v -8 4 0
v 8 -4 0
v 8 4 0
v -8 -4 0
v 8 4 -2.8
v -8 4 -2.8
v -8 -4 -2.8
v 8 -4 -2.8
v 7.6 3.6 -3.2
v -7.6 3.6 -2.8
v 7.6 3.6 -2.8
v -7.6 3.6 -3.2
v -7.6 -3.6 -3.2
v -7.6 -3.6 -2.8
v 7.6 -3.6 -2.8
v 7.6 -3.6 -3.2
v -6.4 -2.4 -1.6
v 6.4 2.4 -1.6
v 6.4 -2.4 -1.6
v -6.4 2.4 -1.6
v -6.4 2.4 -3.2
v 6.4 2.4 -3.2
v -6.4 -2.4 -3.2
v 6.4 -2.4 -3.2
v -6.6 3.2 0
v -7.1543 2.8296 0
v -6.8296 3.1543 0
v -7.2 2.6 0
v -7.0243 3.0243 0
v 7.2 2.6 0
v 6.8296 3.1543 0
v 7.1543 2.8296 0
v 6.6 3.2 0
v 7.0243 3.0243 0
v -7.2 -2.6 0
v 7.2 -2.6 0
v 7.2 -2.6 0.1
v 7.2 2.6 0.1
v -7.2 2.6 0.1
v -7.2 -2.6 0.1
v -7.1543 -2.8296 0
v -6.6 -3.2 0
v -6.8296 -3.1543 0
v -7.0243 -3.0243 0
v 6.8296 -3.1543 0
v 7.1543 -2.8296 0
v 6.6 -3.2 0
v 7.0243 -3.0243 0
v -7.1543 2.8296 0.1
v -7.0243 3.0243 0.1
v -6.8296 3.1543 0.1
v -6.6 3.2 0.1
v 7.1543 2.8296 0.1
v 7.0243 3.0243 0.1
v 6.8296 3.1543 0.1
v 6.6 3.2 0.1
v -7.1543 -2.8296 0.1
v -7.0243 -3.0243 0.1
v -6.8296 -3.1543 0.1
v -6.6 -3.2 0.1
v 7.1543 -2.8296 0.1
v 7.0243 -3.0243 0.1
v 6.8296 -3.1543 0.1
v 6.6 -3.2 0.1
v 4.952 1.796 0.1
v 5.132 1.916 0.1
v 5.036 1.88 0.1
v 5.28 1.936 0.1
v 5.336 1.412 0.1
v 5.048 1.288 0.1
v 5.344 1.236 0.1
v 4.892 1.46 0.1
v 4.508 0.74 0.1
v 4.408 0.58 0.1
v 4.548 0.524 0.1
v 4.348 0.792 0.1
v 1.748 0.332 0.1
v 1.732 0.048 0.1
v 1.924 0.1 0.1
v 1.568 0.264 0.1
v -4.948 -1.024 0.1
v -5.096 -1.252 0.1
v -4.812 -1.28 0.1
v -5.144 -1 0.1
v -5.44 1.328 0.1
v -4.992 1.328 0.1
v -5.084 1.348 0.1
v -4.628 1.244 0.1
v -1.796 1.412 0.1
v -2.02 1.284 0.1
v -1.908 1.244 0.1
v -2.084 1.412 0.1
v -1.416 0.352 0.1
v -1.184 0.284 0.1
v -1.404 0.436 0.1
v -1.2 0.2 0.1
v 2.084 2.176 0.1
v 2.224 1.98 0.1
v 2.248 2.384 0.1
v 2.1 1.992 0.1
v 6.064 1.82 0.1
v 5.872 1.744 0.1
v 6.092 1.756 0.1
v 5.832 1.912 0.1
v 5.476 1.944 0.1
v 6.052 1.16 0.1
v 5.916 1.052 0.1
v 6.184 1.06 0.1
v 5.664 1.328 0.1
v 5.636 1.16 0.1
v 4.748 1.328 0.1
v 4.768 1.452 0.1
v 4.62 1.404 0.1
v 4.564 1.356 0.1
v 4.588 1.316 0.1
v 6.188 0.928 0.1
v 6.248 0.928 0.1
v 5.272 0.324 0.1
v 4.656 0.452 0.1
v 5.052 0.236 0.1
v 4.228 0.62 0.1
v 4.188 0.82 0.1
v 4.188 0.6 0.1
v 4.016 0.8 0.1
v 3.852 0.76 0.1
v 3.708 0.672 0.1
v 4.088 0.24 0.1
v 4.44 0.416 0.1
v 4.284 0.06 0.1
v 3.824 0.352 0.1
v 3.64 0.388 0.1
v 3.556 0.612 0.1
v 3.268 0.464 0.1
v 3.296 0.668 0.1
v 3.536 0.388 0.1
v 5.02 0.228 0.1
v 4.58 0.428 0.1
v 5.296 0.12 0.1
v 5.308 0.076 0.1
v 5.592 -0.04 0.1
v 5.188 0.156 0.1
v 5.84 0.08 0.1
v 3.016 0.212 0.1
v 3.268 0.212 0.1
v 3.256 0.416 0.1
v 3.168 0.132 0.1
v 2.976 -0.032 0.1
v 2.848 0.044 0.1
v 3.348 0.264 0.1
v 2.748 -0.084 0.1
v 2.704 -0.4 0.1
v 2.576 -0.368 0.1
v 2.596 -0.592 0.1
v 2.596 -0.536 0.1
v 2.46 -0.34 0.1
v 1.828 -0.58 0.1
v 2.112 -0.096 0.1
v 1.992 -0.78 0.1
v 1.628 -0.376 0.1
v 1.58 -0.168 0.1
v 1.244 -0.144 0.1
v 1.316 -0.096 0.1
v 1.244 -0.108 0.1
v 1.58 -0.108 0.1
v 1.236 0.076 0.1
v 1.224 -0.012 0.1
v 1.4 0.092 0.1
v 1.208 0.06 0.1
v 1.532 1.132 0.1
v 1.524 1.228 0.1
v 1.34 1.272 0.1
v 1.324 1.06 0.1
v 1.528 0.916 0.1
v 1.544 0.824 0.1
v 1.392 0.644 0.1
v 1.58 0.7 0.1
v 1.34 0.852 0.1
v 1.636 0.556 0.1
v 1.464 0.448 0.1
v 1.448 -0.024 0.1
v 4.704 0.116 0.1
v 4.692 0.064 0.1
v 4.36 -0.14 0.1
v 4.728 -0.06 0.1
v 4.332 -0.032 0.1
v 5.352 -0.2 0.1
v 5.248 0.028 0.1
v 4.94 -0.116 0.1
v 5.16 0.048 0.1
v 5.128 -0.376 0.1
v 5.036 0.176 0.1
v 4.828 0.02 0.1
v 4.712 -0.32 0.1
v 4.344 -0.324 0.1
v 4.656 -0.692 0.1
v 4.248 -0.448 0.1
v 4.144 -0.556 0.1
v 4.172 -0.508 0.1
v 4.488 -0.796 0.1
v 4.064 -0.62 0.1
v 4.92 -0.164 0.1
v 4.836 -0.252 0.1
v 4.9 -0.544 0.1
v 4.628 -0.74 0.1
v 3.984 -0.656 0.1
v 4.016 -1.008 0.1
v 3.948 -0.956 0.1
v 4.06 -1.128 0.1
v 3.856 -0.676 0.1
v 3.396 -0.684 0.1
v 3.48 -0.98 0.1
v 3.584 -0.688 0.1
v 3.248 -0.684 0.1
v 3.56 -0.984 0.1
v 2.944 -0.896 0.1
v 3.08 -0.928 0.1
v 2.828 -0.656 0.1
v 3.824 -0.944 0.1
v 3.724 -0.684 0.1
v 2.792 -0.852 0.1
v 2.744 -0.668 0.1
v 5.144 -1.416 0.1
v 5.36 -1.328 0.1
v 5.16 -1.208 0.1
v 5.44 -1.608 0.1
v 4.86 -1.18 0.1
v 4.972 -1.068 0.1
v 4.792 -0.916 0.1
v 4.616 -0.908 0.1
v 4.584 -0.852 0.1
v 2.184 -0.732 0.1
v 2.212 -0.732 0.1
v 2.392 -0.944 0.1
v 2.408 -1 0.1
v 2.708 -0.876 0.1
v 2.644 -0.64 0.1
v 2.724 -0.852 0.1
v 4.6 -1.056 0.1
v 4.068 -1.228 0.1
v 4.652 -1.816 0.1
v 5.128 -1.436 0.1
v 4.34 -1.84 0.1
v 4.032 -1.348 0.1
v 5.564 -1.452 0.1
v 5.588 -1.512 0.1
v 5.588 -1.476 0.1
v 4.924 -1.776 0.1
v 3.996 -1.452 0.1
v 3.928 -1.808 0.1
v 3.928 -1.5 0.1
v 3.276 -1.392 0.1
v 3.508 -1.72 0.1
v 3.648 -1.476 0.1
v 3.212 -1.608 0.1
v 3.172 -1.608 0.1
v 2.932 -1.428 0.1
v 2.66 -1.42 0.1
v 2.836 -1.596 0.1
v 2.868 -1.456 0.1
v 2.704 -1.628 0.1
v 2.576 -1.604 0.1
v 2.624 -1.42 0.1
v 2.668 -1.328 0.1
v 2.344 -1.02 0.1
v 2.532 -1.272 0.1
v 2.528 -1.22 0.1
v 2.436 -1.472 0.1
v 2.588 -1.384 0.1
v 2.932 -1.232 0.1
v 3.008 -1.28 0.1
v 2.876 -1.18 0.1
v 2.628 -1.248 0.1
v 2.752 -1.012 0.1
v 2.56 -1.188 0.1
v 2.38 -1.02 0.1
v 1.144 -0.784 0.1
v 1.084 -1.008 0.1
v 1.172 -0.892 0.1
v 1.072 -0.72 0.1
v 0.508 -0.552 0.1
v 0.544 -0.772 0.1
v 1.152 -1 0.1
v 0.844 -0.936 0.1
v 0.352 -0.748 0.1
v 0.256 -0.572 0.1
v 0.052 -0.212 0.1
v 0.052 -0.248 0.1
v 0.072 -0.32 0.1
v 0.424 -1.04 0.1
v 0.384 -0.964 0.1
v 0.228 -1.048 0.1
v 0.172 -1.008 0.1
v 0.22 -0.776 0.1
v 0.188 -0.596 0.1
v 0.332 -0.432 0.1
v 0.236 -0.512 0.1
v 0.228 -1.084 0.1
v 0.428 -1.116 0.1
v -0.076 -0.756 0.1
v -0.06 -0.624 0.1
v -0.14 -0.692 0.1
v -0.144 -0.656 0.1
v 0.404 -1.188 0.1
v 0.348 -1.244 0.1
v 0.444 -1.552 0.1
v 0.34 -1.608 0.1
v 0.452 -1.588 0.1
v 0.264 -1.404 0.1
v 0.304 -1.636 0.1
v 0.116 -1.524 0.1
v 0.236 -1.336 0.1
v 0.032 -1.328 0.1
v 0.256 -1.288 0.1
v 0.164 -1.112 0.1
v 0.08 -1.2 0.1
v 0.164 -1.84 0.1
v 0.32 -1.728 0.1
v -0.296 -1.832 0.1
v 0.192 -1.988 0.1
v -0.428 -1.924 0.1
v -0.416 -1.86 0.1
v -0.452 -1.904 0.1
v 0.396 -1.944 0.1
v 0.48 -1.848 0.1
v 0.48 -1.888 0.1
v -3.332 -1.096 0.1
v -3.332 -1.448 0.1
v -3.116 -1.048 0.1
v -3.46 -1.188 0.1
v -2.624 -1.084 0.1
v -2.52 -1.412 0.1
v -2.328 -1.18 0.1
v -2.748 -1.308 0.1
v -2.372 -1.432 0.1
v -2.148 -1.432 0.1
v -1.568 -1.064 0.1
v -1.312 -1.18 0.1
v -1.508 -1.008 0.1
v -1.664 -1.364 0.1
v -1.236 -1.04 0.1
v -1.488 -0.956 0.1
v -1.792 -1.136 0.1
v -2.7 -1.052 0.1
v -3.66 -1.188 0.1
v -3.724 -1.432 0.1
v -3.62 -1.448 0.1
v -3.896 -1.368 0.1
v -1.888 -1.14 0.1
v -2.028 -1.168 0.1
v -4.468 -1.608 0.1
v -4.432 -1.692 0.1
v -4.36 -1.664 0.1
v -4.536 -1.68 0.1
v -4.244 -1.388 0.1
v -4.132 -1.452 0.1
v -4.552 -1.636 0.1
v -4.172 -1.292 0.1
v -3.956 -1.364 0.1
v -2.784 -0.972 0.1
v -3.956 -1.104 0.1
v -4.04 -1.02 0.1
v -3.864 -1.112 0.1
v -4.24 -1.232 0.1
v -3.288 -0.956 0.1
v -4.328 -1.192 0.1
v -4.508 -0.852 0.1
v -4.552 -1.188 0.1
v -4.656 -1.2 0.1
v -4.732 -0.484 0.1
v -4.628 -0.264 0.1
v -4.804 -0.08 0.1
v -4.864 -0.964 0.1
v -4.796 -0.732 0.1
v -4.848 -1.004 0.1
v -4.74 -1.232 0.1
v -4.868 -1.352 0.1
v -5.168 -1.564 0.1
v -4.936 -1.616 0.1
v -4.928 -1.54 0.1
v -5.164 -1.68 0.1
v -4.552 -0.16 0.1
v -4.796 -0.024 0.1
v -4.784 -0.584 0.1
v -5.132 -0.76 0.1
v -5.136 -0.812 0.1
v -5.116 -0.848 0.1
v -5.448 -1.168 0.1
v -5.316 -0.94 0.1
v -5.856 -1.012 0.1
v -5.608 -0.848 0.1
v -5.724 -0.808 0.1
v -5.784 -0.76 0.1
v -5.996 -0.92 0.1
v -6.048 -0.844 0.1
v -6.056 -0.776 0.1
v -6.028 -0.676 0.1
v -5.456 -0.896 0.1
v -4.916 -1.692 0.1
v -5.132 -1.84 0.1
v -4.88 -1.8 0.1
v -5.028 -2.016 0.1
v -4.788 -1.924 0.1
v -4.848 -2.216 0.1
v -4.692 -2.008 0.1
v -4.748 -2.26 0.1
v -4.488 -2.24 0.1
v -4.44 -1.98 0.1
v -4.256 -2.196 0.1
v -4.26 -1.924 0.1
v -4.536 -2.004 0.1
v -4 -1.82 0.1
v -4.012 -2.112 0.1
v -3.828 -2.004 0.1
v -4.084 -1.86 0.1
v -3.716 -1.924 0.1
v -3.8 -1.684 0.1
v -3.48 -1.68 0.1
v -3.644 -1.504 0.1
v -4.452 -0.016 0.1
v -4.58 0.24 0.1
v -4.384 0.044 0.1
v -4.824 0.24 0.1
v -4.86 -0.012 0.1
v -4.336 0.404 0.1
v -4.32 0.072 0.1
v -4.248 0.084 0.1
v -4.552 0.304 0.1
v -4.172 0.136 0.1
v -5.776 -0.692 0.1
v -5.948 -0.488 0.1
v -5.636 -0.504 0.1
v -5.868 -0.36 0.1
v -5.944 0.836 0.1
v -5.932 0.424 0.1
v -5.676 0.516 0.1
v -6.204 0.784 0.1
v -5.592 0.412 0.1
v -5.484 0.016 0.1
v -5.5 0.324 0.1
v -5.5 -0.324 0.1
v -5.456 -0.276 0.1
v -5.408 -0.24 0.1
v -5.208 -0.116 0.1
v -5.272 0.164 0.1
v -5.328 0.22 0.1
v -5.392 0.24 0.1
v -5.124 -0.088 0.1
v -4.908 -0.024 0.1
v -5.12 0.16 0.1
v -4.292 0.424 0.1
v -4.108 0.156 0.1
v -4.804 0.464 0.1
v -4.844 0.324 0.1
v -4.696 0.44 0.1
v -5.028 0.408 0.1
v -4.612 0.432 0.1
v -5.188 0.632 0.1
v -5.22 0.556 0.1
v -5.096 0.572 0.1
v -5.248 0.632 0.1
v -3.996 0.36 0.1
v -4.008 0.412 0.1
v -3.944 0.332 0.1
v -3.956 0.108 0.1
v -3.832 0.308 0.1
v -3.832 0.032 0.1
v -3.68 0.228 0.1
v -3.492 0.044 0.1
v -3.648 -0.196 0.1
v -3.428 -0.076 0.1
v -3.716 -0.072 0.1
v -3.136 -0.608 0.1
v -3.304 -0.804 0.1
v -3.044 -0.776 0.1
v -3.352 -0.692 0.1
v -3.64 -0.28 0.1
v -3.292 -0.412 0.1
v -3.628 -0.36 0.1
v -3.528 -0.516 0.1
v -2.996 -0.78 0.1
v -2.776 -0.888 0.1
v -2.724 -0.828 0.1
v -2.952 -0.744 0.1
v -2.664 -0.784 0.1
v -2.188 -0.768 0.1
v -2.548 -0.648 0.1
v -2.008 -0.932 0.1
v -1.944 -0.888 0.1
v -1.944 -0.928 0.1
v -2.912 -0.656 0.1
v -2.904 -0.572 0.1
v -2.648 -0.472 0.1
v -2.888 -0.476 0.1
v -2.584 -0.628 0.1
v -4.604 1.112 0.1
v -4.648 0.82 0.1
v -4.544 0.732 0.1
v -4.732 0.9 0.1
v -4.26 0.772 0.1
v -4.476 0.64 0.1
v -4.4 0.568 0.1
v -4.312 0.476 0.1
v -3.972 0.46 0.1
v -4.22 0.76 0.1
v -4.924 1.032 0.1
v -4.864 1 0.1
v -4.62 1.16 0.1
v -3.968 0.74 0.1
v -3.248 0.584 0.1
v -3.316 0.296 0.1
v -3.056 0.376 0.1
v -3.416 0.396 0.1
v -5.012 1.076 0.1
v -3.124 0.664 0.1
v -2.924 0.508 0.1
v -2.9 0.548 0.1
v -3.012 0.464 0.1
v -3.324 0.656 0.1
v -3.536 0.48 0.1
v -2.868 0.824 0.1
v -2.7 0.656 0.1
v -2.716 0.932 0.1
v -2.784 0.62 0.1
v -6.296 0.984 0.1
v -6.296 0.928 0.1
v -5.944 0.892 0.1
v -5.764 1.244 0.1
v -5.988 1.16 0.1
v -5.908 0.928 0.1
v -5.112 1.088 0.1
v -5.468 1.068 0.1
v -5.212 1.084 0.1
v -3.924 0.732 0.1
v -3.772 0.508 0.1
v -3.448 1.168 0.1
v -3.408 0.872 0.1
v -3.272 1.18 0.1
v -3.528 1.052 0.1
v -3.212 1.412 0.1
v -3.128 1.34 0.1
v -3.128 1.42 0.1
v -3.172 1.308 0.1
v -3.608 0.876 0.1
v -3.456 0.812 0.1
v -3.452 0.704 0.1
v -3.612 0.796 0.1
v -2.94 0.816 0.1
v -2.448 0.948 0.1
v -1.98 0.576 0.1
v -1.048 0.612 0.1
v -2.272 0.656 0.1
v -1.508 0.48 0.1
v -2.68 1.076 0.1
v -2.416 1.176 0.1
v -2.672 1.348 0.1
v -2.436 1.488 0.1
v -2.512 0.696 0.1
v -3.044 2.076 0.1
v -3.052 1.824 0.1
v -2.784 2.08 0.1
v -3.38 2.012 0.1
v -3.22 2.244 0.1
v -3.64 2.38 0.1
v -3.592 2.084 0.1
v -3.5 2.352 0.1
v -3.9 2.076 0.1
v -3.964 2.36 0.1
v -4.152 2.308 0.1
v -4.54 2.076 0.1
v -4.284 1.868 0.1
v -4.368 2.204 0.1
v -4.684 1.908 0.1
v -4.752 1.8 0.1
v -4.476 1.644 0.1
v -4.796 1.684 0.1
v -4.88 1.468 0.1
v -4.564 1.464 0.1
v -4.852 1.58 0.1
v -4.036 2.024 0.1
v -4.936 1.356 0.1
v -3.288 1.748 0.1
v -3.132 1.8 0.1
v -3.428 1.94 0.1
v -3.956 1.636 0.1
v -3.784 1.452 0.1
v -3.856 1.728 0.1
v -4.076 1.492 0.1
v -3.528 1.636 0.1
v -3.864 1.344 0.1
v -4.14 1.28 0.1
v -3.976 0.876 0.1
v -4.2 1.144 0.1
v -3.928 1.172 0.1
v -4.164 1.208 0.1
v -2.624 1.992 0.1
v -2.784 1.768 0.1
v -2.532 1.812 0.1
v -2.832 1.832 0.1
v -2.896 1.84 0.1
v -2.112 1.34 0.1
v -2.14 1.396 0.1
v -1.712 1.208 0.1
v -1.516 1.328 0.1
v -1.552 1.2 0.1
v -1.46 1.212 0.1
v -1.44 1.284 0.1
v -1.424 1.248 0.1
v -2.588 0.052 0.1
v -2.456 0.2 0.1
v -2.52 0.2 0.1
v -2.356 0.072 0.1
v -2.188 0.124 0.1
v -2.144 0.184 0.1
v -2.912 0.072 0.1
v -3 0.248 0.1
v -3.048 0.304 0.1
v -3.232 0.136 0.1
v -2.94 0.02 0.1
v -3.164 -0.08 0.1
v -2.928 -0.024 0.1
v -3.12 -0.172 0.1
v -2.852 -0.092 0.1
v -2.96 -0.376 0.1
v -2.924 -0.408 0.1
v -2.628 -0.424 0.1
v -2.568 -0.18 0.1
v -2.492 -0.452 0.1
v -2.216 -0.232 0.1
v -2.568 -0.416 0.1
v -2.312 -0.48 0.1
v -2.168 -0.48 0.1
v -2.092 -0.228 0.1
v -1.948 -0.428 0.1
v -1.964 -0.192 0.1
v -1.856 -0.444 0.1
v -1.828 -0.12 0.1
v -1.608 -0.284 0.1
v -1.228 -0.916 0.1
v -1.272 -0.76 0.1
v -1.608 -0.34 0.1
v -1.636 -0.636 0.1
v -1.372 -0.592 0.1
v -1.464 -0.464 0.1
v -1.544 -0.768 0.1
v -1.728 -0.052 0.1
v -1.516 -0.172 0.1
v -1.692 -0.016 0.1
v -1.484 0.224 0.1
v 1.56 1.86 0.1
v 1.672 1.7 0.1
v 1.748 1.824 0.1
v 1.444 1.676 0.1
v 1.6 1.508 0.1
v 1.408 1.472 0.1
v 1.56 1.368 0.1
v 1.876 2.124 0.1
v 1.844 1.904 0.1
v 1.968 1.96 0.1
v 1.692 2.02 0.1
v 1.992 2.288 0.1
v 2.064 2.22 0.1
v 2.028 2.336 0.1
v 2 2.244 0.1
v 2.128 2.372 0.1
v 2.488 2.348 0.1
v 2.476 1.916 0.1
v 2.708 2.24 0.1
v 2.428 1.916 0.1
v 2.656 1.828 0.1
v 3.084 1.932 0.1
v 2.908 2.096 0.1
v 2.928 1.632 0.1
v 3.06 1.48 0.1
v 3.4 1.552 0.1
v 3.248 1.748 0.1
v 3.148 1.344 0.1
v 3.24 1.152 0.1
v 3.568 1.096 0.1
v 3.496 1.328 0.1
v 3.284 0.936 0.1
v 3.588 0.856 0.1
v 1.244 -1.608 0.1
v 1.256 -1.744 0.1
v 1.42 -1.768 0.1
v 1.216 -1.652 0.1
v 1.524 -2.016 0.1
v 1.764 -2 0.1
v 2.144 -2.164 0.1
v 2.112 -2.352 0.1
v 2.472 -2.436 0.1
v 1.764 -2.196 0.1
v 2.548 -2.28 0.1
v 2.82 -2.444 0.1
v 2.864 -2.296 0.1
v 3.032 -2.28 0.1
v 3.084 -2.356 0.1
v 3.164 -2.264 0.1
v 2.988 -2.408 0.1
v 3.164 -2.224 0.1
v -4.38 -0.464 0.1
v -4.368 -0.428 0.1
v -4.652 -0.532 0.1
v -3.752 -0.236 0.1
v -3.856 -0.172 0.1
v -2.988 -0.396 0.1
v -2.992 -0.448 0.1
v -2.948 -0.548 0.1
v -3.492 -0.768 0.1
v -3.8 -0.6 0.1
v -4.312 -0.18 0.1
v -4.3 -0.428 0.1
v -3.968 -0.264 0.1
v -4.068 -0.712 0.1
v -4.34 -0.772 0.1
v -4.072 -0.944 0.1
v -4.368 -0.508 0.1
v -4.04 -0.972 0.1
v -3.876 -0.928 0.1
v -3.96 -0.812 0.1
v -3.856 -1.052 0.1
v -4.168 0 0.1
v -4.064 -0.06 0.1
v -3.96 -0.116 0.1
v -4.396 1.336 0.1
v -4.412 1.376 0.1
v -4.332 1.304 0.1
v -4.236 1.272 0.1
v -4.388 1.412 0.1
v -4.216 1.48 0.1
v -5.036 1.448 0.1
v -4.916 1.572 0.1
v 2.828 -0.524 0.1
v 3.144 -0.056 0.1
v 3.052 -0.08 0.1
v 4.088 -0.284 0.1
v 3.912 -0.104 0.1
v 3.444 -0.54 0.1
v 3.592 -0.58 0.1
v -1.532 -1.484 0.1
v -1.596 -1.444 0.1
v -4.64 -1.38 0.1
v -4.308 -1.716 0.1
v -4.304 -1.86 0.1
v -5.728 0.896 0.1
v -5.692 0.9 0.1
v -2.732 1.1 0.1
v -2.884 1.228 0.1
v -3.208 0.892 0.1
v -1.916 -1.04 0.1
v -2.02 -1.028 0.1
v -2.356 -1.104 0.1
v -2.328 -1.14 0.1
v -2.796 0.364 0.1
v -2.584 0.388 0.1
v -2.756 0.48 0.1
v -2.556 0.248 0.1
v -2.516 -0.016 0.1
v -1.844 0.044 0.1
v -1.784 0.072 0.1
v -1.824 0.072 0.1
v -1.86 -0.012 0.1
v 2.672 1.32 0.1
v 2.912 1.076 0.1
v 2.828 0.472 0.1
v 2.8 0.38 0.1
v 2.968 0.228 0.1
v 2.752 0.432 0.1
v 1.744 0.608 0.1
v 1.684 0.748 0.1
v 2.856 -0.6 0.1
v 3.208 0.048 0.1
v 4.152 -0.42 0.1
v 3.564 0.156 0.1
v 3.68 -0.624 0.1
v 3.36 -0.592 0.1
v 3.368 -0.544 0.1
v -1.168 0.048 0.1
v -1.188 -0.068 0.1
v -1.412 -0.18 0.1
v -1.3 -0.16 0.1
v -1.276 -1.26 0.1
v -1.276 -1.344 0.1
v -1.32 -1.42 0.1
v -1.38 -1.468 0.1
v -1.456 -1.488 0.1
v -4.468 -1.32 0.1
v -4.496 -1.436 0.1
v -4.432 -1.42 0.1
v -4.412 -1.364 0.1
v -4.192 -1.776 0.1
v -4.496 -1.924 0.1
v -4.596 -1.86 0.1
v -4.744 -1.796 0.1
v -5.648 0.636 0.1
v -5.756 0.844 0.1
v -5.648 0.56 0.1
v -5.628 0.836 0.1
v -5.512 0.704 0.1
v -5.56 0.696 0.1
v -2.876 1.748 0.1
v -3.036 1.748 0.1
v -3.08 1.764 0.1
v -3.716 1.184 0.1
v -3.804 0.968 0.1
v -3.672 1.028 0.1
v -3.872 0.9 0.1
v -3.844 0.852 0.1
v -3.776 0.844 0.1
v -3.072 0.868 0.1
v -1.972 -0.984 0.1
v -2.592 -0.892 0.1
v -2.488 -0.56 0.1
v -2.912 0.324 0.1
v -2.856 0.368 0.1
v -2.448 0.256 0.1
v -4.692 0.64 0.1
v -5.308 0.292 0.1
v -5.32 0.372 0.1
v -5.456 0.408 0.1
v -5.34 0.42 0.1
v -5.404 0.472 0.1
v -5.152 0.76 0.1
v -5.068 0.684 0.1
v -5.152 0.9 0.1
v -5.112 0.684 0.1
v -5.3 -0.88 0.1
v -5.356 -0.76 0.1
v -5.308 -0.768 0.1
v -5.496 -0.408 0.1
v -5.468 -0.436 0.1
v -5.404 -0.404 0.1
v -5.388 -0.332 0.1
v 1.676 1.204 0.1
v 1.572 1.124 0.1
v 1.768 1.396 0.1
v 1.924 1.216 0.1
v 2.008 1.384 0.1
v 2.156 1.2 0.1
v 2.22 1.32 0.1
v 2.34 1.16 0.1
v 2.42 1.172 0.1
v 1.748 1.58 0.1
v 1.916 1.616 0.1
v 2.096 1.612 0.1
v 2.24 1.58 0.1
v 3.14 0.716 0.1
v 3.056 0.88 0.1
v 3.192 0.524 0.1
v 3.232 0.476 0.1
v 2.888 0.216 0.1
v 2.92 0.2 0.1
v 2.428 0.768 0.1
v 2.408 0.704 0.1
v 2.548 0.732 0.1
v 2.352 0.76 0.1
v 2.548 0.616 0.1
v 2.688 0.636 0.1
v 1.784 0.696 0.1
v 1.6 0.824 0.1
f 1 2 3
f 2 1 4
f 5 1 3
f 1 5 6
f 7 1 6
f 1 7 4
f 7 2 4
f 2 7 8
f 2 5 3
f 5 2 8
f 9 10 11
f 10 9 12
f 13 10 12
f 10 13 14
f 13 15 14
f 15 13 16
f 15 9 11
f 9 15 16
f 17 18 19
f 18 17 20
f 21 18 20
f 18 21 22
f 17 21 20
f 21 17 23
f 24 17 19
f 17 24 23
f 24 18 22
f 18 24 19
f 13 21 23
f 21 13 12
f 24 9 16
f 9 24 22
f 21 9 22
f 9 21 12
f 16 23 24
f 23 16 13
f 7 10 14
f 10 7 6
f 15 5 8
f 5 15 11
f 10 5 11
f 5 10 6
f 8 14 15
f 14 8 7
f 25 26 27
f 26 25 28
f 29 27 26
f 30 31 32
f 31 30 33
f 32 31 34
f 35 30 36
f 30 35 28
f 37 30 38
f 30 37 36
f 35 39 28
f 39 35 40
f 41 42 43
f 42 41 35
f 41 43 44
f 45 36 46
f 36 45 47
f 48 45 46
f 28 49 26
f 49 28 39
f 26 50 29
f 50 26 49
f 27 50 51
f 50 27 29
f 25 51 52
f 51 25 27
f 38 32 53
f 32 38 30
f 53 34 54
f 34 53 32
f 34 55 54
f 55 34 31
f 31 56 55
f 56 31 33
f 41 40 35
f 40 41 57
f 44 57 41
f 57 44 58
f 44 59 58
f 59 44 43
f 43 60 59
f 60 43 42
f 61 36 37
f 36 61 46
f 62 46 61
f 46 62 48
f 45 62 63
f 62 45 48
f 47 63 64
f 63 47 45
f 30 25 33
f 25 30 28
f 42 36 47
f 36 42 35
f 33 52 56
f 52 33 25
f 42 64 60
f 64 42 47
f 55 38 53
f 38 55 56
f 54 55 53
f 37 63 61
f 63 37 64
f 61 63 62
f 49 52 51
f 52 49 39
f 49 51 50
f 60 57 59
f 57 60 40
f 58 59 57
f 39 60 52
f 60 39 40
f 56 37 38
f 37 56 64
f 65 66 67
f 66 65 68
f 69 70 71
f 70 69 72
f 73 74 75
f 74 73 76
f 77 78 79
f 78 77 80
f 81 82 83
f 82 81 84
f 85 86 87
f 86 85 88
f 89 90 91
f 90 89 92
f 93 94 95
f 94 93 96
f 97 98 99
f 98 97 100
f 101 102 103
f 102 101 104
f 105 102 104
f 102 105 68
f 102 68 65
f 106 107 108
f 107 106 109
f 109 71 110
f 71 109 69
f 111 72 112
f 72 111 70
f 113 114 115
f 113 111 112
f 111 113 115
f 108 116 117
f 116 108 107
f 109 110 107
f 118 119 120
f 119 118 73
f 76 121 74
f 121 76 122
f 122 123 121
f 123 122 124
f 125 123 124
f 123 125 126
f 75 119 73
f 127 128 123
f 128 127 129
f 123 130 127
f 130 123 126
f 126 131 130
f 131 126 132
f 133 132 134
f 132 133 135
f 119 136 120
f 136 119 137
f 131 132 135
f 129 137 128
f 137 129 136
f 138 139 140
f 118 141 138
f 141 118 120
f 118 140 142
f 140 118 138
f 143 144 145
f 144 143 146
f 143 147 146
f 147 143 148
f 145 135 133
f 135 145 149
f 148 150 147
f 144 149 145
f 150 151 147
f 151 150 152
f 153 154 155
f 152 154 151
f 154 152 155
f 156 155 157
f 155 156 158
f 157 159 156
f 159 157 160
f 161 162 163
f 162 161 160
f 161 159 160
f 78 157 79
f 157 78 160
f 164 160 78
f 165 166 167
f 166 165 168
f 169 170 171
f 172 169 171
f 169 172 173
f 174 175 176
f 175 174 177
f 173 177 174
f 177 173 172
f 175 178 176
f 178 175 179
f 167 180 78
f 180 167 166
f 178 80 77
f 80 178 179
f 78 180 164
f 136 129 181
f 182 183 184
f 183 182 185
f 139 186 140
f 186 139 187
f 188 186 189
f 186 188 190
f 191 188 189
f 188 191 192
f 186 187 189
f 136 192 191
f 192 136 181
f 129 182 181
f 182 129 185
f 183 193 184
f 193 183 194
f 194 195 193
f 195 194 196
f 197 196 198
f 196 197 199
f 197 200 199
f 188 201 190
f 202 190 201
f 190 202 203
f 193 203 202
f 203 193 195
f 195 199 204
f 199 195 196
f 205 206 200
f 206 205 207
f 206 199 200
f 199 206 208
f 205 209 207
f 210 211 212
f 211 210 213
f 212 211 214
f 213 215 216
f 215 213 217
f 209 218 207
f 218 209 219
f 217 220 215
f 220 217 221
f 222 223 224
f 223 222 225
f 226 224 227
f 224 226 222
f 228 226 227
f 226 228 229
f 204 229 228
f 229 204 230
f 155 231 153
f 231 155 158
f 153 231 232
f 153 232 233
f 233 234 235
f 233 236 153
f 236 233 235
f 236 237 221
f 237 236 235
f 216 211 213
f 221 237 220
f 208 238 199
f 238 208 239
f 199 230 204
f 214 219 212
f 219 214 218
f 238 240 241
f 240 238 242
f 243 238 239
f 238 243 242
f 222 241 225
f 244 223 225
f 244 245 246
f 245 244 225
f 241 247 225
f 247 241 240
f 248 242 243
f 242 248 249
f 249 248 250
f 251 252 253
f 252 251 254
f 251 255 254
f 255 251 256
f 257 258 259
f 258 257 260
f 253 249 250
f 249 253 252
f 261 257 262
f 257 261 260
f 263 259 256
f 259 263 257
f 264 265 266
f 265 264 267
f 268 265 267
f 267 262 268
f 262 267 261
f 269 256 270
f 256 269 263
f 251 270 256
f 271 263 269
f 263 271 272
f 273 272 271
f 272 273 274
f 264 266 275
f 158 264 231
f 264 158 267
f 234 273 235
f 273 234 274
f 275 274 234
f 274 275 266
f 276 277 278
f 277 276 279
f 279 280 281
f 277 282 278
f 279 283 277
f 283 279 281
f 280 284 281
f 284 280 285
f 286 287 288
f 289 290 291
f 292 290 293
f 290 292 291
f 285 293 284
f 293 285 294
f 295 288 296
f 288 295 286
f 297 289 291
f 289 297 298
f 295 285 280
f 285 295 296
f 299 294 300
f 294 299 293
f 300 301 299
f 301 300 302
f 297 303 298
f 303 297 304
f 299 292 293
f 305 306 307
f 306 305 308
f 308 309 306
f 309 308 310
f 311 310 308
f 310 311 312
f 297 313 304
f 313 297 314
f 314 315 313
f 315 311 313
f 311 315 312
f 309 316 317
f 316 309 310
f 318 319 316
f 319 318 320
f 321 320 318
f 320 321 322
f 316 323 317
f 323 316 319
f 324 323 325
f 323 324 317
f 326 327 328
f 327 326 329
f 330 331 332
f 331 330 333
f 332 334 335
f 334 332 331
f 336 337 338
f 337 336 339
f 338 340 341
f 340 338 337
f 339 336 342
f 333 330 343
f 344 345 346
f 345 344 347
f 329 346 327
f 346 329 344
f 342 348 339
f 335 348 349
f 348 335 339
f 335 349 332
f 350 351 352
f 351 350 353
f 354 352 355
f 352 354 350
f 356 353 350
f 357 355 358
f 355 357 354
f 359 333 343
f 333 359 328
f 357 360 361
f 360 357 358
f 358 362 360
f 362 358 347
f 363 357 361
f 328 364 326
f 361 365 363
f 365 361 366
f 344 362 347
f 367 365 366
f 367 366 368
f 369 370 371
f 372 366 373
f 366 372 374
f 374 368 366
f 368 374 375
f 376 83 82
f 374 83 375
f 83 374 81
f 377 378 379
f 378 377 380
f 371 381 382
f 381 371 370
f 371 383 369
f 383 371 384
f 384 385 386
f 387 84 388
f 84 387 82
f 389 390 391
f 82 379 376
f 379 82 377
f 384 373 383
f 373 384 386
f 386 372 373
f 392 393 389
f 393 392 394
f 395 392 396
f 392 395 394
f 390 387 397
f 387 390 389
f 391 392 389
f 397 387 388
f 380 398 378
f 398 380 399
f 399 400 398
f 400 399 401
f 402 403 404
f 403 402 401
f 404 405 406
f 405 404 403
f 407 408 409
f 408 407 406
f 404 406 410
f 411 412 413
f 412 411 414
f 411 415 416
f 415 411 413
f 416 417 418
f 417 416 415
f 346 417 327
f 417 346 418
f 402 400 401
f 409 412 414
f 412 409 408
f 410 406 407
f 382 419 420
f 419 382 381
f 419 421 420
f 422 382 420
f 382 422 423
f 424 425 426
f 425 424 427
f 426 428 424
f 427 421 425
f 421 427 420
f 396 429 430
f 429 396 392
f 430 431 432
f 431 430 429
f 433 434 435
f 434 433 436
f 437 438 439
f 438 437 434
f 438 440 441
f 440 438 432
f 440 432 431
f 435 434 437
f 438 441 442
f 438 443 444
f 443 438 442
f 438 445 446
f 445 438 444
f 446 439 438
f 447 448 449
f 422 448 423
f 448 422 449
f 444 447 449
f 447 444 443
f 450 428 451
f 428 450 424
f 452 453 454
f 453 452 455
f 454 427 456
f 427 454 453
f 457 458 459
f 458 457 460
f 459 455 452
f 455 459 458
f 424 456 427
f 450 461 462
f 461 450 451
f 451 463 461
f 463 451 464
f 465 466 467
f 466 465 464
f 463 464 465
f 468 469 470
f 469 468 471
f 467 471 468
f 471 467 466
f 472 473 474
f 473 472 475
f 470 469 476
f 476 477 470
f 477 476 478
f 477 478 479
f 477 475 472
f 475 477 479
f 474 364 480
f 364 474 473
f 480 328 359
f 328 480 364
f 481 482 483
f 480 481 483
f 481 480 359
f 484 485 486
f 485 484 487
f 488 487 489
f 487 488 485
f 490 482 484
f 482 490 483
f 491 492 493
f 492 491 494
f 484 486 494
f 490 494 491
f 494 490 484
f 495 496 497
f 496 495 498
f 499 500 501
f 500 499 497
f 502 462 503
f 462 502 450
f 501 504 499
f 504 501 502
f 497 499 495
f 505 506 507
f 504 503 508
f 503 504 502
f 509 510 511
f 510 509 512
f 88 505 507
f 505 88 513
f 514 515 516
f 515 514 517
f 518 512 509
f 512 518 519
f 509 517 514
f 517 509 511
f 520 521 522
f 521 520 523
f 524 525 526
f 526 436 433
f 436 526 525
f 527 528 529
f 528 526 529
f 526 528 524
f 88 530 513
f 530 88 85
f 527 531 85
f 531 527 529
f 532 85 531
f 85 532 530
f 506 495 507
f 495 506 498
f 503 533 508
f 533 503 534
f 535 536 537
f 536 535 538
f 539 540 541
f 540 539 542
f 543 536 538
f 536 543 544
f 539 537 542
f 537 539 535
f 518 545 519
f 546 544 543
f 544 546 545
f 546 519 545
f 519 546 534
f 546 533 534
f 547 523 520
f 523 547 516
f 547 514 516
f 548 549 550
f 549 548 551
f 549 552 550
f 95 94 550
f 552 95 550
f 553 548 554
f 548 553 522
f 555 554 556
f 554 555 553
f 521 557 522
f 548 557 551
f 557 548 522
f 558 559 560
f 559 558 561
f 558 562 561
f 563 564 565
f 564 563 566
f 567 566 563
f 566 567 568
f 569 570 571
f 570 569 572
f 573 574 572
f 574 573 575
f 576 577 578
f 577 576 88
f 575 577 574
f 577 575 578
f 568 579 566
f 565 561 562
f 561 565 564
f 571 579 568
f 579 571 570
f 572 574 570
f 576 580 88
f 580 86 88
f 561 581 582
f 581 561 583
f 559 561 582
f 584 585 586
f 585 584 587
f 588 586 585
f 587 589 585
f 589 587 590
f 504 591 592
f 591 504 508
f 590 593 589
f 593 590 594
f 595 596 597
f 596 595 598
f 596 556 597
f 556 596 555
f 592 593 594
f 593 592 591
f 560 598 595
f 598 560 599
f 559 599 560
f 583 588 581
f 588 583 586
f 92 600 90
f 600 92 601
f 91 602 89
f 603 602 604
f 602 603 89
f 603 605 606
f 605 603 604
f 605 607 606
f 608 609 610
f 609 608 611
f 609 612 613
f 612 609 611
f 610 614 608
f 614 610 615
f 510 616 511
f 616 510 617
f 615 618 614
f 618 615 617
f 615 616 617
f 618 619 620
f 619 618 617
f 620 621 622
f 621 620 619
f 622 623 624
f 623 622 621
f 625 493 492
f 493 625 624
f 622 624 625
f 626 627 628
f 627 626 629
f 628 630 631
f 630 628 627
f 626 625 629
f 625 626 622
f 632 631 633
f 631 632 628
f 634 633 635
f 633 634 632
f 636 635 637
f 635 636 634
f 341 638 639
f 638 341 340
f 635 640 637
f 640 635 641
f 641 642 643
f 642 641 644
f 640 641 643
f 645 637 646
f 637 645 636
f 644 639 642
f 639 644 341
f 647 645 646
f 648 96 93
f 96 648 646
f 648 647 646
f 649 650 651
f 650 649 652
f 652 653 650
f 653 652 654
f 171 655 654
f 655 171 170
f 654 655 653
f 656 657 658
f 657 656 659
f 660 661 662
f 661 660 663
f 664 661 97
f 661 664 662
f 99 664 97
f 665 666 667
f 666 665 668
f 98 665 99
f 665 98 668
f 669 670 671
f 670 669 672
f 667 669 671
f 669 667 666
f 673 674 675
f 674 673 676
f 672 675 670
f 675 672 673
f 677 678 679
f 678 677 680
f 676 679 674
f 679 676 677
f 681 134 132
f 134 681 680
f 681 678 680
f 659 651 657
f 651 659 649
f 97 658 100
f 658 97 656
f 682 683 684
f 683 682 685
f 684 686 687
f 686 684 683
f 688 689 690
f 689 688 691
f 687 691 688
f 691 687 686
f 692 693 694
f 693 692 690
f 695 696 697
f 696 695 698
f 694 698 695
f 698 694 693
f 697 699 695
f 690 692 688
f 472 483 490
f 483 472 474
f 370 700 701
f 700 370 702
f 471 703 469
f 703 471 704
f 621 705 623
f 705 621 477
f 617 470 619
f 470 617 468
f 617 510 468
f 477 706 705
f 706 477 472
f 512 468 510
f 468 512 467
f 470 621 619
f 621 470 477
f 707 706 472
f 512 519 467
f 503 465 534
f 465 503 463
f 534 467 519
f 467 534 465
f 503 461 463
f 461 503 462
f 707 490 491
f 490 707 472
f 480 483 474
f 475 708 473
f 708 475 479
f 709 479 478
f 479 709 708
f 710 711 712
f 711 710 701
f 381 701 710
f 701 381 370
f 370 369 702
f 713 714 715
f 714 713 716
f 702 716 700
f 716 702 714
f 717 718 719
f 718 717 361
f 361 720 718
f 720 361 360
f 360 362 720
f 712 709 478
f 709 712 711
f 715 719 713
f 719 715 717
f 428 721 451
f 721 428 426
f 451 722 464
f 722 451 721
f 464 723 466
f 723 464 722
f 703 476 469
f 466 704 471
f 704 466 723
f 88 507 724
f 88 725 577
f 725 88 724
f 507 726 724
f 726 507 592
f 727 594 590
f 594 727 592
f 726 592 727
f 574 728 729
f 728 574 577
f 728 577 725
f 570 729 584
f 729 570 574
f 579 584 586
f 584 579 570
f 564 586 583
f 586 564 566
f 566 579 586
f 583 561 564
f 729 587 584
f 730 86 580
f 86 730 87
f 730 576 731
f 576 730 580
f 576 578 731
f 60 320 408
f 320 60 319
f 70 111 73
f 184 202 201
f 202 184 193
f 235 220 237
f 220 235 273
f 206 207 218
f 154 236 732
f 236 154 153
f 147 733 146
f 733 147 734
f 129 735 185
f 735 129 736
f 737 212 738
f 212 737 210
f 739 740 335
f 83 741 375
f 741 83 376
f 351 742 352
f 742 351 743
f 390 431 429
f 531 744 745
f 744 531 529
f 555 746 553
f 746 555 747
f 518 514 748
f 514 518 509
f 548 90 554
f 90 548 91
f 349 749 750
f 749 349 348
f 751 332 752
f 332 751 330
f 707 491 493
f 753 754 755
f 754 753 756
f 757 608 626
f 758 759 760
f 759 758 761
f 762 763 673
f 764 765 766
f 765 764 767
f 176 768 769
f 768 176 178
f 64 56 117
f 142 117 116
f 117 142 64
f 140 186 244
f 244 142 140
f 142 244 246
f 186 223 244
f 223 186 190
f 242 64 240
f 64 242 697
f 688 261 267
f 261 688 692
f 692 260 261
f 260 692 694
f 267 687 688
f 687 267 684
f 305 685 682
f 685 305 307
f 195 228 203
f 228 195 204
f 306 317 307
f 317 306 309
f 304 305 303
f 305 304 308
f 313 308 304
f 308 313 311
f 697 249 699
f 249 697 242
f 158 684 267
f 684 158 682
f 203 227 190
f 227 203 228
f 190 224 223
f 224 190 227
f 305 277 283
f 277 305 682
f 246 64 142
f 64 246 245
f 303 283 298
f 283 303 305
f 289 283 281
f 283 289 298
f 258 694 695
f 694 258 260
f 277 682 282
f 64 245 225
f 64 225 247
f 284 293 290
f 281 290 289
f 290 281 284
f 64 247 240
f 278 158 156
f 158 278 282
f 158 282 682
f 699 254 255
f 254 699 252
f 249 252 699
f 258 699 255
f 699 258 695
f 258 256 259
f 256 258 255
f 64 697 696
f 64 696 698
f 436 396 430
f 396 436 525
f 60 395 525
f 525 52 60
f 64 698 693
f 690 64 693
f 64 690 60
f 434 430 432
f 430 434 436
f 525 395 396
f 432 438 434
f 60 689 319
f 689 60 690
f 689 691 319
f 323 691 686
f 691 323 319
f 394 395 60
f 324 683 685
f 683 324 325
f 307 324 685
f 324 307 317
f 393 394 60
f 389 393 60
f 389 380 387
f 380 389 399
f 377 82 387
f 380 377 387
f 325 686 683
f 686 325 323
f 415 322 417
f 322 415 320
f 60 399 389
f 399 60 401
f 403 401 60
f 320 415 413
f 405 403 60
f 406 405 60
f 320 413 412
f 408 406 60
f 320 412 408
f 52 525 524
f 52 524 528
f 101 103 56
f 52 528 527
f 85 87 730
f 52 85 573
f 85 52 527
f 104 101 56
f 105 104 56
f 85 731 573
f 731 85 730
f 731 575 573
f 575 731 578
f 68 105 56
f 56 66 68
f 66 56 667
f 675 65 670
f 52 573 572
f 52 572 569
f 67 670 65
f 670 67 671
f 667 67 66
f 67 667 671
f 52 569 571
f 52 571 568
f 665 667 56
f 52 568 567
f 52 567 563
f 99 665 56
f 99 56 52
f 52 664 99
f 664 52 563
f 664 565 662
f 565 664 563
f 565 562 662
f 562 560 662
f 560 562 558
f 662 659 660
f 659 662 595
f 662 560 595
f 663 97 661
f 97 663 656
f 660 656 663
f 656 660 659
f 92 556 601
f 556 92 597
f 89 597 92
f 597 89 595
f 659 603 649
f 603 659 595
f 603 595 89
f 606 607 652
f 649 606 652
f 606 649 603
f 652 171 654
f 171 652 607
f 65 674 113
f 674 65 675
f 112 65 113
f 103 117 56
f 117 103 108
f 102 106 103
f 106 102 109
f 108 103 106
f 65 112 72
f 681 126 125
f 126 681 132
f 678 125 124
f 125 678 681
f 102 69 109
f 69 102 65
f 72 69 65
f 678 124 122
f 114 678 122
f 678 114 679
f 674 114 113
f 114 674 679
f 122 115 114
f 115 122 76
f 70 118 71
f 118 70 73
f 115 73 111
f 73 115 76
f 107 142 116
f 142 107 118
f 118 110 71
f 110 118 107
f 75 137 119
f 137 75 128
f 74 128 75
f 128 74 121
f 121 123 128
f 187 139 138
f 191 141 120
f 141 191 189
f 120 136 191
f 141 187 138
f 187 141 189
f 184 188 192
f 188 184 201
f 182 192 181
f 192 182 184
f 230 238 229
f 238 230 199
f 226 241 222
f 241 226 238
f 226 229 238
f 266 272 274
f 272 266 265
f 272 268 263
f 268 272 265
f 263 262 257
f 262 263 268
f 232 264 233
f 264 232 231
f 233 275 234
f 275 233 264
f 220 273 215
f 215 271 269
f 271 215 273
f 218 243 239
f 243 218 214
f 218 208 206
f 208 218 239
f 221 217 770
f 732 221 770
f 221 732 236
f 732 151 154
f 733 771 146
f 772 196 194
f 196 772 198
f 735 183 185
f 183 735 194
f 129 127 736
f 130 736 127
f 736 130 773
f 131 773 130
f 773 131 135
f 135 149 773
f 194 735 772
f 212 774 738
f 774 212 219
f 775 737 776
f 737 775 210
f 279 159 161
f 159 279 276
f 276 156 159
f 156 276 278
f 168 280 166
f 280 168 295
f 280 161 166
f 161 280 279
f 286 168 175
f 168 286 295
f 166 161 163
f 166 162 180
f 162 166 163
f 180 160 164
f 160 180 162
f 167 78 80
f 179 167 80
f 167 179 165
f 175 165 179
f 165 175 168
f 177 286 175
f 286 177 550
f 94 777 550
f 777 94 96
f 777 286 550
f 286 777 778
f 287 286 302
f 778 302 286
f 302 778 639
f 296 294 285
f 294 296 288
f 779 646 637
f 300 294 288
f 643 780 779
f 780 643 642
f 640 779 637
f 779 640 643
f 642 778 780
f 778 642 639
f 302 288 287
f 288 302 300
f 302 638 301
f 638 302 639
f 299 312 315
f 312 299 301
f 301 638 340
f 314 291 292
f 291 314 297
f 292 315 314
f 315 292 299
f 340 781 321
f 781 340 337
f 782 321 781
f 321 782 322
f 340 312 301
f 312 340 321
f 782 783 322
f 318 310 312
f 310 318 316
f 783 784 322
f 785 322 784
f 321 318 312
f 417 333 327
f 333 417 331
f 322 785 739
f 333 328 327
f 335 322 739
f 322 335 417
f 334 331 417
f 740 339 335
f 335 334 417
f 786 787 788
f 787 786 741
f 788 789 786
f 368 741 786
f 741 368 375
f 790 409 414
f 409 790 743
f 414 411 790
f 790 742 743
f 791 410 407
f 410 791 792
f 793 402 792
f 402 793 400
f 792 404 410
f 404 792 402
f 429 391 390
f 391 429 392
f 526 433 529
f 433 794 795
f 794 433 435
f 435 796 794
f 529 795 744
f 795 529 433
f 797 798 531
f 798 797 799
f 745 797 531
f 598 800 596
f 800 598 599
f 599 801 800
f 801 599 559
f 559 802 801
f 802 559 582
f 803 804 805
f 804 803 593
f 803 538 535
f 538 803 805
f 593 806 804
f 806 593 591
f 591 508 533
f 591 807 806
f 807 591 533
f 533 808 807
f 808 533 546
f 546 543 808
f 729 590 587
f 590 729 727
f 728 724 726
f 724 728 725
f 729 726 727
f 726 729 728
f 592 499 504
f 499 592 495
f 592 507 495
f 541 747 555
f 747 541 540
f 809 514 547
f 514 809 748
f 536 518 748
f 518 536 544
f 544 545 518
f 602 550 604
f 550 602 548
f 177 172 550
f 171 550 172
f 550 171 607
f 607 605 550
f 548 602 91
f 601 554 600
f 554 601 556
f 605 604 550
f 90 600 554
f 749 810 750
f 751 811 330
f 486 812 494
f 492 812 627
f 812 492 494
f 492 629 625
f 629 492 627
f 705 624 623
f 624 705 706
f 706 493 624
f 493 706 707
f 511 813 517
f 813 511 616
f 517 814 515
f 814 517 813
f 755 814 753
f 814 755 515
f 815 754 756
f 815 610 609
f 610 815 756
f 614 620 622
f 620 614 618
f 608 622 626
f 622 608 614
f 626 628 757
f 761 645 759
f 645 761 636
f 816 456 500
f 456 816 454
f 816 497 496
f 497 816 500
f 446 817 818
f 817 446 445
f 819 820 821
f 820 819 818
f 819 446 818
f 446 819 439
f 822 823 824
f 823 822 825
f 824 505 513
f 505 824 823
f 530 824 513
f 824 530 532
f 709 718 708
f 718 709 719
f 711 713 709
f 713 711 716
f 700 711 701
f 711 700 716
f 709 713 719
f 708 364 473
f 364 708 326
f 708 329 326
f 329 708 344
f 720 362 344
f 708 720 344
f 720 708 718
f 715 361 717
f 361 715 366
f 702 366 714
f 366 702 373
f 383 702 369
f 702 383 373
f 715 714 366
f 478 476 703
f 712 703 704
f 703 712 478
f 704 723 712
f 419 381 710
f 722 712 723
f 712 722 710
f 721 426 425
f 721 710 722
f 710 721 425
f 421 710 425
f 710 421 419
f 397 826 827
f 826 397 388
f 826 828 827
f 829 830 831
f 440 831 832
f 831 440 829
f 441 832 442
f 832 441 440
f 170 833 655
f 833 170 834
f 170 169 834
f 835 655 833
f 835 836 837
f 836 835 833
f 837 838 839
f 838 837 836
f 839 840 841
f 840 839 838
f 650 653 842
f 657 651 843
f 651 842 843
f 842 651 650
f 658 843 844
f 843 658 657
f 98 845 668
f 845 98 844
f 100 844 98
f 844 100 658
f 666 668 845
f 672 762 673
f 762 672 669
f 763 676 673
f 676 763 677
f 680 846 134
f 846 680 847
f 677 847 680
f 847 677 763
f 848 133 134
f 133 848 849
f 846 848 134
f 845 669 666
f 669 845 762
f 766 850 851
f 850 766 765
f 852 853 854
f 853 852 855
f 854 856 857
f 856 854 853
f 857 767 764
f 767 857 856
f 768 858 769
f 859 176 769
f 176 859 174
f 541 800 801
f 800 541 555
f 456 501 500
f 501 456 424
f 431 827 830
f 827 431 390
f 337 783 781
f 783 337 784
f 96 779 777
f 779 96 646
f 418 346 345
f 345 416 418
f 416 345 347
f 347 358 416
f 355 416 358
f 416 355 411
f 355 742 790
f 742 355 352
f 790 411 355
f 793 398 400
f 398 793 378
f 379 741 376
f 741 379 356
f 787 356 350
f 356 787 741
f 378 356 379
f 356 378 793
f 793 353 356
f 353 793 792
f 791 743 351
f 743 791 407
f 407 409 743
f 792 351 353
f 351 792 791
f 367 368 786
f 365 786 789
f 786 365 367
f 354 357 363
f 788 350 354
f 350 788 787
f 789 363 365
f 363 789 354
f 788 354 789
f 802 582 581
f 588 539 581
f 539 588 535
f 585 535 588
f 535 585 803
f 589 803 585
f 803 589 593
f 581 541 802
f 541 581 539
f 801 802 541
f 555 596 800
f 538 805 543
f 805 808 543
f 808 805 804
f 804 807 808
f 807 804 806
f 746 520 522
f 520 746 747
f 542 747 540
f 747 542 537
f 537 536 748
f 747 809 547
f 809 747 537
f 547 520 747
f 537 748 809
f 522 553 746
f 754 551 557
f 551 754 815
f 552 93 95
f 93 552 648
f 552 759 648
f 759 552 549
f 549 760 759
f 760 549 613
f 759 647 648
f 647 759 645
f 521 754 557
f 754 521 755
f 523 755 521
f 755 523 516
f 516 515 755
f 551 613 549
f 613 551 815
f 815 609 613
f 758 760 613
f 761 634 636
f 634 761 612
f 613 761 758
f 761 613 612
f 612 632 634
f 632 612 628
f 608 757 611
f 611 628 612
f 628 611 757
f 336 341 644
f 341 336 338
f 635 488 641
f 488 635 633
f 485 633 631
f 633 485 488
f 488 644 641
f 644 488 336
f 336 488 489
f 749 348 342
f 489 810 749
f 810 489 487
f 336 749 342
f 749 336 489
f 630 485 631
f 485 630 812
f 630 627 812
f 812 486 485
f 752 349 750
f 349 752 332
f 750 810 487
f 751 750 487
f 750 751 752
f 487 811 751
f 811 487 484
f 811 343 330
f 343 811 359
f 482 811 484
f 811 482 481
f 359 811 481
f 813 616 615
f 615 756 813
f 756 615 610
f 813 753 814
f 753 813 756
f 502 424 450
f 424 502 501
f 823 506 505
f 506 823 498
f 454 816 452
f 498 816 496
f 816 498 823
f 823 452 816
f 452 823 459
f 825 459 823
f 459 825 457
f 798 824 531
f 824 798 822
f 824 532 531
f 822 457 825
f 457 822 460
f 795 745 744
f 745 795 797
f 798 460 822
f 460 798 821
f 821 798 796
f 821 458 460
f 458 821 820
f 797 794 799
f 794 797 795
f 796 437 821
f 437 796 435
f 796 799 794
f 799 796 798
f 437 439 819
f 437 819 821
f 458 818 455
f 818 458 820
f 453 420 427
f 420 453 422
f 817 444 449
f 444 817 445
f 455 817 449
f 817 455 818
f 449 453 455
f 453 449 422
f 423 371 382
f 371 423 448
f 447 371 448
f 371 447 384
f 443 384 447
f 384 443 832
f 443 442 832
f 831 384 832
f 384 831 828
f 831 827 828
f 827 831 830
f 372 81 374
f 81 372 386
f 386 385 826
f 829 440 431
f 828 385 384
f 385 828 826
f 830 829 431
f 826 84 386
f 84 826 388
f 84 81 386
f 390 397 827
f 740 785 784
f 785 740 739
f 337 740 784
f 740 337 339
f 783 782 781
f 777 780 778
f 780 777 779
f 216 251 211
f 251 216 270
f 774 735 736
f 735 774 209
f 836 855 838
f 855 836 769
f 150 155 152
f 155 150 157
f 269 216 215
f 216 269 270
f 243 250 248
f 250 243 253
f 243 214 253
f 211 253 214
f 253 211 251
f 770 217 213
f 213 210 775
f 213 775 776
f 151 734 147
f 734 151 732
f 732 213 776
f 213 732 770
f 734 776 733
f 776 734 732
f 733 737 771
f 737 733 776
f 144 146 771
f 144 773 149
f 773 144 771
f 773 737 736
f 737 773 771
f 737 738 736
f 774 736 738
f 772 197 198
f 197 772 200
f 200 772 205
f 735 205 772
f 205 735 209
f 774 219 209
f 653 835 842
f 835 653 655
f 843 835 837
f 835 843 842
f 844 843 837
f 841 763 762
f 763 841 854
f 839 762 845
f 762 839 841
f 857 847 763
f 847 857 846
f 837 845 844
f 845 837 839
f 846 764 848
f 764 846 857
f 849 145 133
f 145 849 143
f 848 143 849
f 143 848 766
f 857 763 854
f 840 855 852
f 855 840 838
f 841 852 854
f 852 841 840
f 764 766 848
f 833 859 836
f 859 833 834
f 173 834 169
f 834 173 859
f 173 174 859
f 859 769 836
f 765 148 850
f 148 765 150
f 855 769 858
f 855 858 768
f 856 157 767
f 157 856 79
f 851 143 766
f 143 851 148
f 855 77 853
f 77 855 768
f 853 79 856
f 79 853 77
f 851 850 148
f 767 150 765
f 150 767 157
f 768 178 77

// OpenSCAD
use <../lib.scad>
use <3069b.scad>
use <6435269f.scad>
function ldraw_lib__3069bd1e() = [
// 0 Tile  1 x  2 with Flower and Butterfly Sketch Sticker
// 0 Name: 3069bd1e.dat
// 0 Author: Philippe Hurbain [Philo]
// 0 !LDRAW_ORG Shortcut UPDATE 2025-08
// 0 !LICENSE Licensed under CC BY 4.0 : see CAreadme.txt
// 
// 0 BFC CERTIFY CCW
  [0,"BFC","CERTIFY"],
  [0,"BFC","CCW"],
// 
// 0 !CATEGORY Sticker Shortcut
// 0 !KEYWORDS Bricklink 41757stk01, Brickowl 752076, Rebrickable 10103449
// 0 !KEYWORDS Set 41757
// 
// 0 !HISTORY 2025-08-31 [OrionP] Official Update 2025-08
// 
// 1 16 0 0 0 1 0 0 0 1 0 0 0 1 3069b.dat
  [1,16,0,0,0,1,0,0,0,1,0,0,0,1, ldraw_lib__3069b()],
// 1 16 0 0 0 1 0 0 0 1 0 0 0 1 6435269f.dat
  [1,16,0,0,0,1,0,0,0,1,0,0,0,1, ldraw_lib__6435269f()],
];
module ldraw_lib__3069bd1e(step=0, col=false, unit=2/5, alt=false, line=0.2, solid=!$preview)
    makepoly(ldraw_lib__3069bd1e(), step=step, col=col, unit=unit, alt=alt, line=line, solid=solid);
ldraw_lib__3069bd1e(line=0.2);
